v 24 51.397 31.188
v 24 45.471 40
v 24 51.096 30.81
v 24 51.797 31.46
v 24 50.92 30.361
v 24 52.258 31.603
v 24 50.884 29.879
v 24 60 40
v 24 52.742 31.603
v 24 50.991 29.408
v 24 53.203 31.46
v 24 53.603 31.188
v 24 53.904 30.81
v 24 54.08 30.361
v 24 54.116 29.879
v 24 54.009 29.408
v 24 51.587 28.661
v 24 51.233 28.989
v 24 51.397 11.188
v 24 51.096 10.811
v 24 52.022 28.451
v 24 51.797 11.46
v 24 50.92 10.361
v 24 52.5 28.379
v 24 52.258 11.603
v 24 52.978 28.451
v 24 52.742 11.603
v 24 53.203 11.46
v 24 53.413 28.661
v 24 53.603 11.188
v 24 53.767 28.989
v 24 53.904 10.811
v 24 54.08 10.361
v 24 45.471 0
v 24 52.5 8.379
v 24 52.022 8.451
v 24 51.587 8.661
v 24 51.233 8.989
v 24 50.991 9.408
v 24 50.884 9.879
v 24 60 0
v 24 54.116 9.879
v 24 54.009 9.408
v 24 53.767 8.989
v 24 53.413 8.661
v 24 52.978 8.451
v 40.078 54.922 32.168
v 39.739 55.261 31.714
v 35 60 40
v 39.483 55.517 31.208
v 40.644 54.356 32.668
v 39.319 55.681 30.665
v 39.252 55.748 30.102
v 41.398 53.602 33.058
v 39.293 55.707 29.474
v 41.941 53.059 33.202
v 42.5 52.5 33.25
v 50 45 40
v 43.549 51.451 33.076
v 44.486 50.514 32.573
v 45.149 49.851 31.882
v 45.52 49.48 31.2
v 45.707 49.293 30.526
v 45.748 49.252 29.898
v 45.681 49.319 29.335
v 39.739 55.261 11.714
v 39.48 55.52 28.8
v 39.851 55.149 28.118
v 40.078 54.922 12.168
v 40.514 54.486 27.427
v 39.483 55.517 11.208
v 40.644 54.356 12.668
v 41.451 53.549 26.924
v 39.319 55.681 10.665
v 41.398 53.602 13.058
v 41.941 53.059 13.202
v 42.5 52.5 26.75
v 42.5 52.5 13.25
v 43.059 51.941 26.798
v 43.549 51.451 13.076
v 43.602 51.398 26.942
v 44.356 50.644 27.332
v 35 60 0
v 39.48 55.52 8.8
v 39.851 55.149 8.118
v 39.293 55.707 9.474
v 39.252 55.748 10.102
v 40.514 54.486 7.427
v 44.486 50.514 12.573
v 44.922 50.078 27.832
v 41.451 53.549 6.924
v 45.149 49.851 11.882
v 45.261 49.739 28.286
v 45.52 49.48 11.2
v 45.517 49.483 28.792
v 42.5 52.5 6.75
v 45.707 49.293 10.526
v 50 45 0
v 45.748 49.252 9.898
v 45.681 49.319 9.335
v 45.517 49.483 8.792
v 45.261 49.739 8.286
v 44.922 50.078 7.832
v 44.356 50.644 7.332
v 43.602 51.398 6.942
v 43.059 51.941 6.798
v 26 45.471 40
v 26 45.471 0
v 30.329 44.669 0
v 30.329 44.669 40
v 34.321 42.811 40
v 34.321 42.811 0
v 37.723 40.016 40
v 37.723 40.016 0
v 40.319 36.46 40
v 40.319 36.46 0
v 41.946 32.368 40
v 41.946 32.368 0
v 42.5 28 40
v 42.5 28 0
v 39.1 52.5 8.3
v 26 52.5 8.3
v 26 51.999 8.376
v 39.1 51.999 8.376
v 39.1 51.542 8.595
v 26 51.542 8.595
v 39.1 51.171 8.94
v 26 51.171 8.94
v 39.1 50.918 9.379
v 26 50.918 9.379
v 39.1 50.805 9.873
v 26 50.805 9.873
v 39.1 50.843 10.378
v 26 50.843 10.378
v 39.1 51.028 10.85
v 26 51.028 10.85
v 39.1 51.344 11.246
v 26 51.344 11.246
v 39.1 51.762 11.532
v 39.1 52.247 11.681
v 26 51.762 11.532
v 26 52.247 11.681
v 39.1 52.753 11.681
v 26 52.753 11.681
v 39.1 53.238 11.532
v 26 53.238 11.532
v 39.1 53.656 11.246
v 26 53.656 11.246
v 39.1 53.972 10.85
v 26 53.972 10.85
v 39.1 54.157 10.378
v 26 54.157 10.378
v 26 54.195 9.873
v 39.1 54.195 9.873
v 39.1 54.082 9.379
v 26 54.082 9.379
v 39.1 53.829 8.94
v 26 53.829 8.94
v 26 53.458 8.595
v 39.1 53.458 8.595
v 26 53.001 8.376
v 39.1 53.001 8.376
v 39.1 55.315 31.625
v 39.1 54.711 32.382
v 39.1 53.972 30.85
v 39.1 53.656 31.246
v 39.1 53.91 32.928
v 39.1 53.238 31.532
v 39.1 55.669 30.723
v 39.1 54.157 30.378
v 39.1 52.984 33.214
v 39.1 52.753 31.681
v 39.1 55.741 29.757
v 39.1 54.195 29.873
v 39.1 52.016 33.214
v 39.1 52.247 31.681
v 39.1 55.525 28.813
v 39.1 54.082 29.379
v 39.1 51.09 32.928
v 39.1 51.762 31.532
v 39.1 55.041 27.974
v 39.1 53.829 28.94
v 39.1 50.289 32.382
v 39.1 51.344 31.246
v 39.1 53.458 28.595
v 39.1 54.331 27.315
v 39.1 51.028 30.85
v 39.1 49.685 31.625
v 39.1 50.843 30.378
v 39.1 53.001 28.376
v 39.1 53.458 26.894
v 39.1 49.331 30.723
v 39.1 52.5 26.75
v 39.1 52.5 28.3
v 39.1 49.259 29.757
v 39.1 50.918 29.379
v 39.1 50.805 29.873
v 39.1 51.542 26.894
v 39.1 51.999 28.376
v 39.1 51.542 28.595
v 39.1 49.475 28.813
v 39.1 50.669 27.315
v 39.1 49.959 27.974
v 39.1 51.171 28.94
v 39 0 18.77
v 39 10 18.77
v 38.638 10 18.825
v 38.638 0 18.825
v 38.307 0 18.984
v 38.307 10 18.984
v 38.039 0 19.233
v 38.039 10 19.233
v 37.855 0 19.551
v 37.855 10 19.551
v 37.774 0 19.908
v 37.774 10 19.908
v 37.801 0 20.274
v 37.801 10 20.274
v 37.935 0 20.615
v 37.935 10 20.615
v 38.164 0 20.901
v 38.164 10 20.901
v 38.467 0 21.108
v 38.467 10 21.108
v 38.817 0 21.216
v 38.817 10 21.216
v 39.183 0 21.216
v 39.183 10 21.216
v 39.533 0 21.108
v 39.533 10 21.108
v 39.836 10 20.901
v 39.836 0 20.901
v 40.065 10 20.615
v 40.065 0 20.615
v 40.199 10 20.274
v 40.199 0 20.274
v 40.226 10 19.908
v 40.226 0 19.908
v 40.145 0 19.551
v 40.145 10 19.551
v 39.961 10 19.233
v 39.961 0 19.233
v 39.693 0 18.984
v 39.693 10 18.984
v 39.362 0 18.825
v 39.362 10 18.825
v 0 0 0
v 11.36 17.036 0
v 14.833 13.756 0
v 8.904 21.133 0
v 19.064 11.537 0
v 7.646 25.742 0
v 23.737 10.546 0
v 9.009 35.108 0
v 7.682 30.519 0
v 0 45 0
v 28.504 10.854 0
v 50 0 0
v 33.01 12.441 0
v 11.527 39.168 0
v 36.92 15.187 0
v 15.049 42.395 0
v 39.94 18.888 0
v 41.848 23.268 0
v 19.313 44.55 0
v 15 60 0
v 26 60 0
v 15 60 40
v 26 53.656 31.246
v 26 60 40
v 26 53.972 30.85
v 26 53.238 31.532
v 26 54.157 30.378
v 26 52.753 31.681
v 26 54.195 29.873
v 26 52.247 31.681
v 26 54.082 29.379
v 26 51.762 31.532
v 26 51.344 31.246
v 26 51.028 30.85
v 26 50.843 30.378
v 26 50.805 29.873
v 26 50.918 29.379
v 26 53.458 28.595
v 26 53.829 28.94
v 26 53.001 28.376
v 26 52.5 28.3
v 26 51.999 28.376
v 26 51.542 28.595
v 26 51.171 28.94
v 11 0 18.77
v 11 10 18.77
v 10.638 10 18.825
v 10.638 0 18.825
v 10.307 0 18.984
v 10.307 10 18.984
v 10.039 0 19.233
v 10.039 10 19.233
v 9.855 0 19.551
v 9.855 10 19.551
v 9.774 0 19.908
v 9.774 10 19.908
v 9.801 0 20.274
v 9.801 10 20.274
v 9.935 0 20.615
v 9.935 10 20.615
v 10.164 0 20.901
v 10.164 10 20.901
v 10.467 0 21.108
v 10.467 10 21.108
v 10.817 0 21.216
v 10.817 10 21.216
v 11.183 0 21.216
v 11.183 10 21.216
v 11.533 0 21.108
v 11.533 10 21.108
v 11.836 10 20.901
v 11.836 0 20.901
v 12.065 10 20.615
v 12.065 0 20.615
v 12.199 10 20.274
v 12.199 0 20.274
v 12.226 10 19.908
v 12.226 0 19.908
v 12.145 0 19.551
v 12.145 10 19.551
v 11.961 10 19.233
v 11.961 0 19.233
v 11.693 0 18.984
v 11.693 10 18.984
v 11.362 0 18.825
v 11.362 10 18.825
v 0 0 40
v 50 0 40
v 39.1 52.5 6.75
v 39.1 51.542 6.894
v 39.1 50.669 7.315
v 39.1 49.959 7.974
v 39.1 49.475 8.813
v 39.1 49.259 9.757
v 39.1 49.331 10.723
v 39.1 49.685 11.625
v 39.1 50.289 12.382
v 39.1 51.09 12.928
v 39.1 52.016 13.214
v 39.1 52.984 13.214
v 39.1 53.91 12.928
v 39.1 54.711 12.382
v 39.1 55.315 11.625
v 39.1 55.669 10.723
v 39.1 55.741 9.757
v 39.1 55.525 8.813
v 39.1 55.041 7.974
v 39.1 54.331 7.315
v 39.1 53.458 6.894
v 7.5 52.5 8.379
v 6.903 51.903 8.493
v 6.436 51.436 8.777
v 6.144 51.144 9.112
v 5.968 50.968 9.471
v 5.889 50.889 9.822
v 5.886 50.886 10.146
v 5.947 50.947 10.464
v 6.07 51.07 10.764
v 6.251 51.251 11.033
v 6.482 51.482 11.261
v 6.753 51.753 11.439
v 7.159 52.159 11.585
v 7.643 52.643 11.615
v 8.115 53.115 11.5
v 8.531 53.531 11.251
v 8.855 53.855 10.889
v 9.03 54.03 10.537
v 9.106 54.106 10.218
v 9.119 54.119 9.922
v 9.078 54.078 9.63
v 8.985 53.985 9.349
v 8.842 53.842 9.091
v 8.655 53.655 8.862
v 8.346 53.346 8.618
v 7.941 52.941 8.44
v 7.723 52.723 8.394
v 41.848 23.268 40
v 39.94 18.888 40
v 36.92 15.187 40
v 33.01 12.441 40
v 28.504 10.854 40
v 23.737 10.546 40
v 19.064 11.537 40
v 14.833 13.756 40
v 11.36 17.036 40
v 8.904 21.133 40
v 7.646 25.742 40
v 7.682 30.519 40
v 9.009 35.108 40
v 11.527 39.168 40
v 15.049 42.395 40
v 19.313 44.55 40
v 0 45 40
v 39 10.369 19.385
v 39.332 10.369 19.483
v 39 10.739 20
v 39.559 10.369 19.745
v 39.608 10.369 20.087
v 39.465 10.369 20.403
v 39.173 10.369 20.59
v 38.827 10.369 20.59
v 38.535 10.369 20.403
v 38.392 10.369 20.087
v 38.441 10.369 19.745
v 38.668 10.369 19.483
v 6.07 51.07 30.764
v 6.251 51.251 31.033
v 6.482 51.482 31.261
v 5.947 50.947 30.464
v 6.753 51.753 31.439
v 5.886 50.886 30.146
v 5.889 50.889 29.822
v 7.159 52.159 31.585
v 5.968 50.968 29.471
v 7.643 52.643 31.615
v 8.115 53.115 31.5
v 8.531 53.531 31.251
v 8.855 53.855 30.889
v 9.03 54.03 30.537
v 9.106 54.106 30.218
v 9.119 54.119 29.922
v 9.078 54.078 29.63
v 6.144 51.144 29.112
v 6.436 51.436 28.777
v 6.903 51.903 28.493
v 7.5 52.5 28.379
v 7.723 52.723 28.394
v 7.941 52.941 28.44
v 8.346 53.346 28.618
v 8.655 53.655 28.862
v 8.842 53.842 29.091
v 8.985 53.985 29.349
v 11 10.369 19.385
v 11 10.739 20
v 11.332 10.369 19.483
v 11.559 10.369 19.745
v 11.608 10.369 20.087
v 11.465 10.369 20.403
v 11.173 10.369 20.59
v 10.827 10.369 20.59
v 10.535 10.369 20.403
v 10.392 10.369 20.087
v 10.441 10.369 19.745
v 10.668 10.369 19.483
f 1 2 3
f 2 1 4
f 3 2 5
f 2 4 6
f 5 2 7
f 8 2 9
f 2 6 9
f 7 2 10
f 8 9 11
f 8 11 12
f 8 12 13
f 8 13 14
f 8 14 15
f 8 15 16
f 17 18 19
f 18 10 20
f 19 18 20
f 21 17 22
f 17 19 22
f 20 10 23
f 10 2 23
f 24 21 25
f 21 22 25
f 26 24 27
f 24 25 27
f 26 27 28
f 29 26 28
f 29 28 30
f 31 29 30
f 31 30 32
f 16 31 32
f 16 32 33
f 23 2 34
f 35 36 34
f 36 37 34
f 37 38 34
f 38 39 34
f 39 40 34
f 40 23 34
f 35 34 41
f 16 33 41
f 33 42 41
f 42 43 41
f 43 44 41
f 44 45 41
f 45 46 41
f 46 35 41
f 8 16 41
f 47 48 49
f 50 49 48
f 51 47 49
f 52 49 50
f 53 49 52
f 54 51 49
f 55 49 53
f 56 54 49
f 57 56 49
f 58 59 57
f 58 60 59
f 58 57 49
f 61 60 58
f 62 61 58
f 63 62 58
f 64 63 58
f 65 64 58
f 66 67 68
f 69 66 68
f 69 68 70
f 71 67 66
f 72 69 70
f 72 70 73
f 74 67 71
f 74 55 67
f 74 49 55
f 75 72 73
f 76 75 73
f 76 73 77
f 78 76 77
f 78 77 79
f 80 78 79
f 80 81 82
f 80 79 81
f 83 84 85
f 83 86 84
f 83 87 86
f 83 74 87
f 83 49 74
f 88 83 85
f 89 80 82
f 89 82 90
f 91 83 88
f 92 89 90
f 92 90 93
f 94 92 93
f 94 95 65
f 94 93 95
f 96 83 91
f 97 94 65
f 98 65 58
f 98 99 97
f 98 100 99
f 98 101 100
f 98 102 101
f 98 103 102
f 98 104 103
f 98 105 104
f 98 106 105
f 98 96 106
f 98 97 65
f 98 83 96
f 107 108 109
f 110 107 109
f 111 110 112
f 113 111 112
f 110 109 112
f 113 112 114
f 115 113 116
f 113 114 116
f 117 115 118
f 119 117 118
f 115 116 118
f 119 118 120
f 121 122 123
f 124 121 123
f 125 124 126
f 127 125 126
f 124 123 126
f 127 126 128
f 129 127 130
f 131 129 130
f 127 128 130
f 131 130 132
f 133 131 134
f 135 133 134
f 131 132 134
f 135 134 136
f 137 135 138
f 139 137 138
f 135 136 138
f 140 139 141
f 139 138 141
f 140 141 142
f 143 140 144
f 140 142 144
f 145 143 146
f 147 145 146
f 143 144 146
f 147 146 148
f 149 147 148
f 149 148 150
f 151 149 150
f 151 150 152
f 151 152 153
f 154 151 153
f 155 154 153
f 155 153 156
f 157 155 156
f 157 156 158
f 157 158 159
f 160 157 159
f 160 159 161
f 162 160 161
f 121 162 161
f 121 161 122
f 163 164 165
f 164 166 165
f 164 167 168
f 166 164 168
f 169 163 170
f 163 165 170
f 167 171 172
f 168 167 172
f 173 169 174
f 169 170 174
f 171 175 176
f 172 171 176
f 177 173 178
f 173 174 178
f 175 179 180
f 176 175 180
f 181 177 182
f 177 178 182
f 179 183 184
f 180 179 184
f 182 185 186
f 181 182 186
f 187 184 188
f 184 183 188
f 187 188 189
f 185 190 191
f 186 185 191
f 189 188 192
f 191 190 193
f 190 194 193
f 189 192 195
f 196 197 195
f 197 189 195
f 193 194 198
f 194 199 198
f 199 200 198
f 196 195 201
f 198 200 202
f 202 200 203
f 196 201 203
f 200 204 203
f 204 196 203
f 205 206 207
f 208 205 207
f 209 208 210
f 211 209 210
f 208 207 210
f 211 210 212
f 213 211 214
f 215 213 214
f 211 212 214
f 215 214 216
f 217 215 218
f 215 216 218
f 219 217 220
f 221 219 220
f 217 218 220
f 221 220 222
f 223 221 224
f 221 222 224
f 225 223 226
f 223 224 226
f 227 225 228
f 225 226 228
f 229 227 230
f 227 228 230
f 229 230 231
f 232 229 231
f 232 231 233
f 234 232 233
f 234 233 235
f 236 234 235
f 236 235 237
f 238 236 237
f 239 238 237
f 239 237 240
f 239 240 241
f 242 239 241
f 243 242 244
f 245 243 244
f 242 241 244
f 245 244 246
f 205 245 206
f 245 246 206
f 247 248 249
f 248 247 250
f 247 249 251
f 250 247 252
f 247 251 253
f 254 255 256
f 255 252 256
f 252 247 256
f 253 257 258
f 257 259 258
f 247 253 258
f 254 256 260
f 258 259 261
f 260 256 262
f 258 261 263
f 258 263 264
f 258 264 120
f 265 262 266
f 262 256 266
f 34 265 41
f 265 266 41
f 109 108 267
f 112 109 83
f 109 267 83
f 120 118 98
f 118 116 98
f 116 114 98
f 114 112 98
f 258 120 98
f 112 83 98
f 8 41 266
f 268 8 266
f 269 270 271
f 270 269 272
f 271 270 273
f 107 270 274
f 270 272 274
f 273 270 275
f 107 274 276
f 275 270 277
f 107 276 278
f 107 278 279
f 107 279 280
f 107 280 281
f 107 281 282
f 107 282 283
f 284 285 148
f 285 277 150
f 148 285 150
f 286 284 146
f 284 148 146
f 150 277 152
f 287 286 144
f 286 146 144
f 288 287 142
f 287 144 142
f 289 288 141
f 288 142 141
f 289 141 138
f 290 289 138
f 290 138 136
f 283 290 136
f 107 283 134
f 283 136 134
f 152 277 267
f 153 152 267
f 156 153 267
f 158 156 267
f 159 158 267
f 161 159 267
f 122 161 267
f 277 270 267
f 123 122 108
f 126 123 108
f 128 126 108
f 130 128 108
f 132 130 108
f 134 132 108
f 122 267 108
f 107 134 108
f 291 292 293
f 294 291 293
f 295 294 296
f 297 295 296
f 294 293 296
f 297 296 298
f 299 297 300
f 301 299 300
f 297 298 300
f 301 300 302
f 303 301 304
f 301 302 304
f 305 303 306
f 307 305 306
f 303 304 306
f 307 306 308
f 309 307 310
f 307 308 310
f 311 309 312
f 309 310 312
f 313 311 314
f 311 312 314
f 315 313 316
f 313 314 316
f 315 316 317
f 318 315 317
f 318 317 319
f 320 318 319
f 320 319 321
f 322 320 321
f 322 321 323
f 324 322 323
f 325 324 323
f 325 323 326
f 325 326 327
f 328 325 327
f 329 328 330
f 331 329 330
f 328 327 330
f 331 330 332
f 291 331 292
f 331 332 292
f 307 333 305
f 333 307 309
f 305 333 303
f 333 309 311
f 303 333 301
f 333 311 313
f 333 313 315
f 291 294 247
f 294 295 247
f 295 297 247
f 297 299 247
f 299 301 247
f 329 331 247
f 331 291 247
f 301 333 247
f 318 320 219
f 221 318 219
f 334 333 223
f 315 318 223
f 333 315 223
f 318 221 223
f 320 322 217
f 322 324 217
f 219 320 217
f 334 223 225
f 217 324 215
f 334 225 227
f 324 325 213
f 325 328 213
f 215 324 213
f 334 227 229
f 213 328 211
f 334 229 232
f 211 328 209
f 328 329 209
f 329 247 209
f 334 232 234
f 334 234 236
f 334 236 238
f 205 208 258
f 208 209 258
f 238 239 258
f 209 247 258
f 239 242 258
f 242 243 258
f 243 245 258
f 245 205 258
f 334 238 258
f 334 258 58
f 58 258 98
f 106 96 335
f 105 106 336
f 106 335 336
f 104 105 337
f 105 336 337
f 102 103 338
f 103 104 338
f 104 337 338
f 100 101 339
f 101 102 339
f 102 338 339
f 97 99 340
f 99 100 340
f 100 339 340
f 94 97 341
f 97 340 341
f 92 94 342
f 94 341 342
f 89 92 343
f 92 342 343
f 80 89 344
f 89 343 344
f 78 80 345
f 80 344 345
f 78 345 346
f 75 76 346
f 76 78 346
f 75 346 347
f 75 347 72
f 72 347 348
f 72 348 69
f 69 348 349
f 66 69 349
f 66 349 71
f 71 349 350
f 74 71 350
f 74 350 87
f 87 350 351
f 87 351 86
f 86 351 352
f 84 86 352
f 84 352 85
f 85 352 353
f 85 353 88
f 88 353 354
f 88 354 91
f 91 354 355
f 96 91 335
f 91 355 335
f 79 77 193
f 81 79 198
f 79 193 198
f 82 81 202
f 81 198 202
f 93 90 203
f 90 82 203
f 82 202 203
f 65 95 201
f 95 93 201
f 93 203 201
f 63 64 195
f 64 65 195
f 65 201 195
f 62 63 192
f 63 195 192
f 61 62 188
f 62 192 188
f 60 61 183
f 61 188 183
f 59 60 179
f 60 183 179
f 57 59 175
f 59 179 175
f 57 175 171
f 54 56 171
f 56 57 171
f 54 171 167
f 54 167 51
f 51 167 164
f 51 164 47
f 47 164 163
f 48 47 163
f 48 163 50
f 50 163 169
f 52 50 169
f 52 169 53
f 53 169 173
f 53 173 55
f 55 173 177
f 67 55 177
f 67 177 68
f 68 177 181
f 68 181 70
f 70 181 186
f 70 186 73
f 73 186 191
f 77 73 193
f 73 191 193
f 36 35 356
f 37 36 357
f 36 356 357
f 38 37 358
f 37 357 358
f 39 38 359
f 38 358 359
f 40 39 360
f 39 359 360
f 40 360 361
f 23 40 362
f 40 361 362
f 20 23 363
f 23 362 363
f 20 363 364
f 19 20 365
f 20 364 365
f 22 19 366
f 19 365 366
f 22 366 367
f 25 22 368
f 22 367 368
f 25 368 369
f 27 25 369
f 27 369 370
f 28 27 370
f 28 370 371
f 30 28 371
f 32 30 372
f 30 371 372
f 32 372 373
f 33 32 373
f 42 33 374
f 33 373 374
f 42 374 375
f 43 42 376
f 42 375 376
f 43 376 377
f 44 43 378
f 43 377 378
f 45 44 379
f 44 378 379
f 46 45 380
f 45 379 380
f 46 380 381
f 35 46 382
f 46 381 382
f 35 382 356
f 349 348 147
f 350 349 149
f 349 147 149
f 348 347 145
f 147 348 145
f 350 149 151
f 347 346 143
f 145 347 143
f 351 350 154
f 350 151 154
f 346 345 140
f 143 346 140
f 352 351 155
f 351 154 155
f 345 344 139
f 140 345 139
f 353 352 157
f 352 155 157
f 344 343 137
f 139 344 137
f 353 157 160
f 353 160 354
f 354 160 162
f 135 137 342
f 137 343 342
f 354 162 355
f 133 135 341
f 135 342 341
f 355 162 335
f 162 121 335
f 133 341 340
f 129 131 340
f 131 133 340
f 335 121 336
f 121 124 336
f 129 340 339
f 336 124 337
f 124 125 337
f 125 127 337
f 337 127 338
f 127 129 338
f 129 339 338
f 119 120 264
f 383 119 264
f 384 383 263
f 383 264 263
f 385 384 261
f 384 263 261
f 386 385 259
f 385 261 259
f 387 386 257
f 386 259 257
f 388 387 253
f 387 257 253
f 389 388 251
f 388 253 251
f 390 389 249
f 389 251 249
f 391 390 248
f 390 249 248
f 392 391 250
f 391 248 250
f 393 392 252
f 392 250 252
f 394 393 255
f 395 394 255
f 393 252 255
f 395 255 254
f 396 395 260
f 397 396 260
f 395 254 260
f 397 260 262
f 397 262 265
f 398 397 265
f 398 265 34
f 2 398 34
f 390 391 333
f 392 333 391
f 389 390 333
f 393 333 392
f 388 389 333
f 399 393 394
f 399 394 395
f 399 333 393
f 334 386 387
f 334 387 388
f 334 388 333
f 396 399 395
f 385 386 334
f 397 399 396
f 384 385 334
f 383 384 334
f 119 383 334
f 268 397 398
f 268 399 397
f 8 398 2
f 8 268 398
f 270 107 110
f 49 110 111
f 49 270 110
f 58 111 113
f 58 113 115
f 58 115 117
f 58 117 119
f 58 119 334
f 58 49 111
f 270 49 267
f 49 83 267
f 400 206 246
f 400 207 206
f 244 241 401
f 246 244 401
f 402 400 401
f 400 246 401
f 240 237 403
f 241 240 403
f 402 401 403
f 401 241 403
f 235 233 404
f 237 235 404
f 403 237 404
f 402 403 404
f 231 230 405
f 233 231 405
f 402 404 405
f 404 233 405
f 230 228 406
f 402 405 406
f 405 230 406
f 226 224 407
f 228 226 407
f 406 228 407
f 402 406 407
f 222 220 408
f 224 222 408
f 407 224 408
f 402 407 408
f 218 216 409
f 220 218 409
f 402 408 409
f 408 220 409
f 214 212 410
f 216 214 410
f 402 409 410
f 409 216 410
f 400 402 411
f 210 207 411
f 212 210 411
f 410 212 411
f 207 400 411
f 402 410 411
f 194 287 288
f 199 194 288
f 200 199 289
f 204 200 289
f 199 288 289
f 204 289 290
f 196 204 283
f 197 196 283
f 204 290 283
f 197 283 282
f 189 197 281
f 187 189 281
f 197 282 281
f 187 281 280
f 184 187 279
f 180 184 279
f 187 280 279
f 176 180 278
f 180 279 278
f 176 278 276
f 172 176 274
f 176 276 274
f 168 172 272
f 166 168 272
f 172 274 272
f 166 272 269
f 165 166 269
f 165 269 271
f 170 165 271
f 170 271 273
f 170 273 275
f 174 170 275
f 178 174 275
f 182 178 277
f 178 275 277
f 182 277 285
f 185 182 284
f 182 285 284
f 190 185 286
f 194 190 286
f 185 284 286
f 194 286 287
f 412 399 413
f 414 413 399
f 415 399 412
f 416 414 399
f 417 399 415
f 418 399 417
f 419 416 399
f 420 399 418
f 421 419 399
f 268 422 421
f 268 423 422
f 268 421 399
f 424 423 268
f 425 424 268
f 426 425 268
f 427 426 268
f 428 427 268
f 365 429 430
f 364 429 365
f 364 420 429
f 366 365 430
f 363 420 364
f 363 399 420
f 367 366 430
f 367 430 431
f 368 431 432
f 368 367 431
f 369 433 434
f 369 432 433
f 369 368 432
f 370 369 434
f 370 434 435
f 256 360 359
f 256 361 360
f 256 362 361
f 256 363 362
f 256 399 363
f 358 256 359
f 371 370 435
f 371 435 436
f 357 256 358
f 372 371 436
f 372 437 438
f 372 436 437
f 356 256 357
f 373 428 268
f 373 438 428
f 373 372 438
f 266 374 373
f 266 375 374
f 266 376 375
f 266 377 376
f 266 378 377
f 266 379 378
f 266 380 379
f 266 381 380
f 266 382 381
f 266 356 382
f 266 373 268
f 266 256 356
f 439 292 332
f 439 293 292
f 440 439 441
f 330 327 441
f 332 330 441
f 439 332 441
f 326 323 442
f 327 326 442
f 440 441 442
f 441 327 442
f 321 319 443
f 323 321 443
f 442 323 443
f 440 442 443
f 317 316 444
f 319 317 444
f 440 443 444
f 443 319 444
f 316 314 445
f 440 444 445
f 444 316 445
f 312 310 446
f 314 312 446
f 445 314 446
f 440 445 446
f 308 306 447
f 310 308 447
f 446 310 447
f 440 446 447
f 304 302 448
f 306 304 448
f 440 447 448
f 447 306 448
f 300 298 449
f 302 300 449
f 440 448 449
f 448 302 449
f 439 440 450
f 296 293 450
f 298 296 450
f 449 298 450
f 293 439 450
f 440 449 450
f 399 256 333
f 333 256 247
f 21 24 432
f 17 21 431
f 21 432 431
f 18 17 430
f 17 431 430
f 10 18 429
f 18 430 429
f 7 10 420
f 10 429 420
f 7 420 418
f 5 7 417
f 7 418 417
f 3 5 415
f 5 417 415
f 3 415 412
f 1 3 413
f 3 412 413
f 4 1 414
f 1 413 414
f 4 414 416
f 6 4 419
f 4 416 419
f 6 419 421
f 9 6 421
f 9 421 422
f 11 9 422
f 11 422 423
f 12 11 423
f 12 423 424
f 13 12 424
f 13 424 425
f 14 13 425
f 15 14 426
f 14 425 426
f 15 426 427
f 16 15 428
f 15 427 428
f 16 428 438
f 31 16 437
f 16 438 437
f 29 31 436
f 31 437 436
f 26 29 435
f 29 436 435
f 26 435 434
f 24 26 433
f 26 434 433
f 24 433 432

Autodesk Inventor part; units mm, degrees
sketch "Skizze1" plane through (0, 0, 0) normal (0, 0, 1) x (1, 0, 0)
  line L0 (0, 0) -> (50, 0)
  line L1 (50, 0) -> (50, 45)
  line L2 (35, 60) -> (15, 60)
  line L3 (0, 45) -> (0, 0)
  circle A0 centre (25, 28) radius 17.5
  line L4 (25, 28) -> (25, 0) construction
  line L5 (0, 45) -> (15, 60)
  line L6 (35, 60) -> (50, 45)
  line L7 (24, 60) -> (26, 60)
  line L8 (26, 60) -> (26, 28)
  line L9 (26, 28) -> (24, 28)
  line L10 (24, 28) -> (24, 60)
  point P0 (50, 60)
  point P1 (0, 60)
  point P2 (25, 60)
  dimension "d0" = 50
  dimension "d1" = 35
  dimension "d2" = 60
  dimension "d3" = 15
  dimension "d4" = 15
  dimension "d5" = 15
  dimension "d6" = 15
  dimension "d7" = 28
  dimension "d10" = 2
extrude "Extrusion1" add sketch "Skizze1" along normal blind 40 contours L3 L5 L2 L10 A0 L8 L6 L1 L0 | L2 L8 A0 L10
extrude "Extrusion2" cut sketch "Skizze1" along normal up to surface (40 mm away) contours L2 L8 A0 L10 | A0 L8 L9 L10 picked at (24.8888, 33.8323)
sketch "Skizze2" plane through (0, 0, 0) normal (0, -1, 0) x (1, 0, 0)
  line L0 (0, 0) -> (0, 40) construction
  line L1 (50, 0) -> (50, 40) construction
  line L2 (0, 40) -> (50, 40) construction
  line L3 (0, 0) -> (0, 40) construction
  line L4 (25, 20) -> (25, 40) construction
  line L5 (7.5, 40) -> (42.5, 40) construction
  line L6 (11, 20) -> (39, 20) construction
  point P0 (26, 40)
  point P1 (24, 40)
  point P2 (0, 20)
  dimension "d13" = 28
hole "Bohrung1" at (11, 0, 20) at (39, 0, 20) direction (0, 1, 0) diameter 2.459 depth 10 tip angle 118 thread size "M3x0.5" class "6H" standard "ISO Metric profile"
ref_plane "Arbeitsebene1" through (42.5, 0, 0) normal (1, 0, 0) x (0, 0, -1)
sketch "Skizze3" plane through (42.5, 0, 0) normal (1, 0, 0) x (0, 0, -1)
  line L0 (0, 60) -> (-40, 60) construction
  line L1 (0, 45) -> (-40, 45) construction
  line L2 (-40, 45) -> (-40, 60) construction
  line L3 (-40, 52.5) -> (0, 52.5) construction
  line L4 (0, 45) -> (0, 60) construction
  point P0 (0, 0)
  point P1 (-20, 52.5)
  point P2 (-30, 52.5)
  point P3 (-10, 52.5)
  dimension "d44" = 10
  dimension "d45" = 10
ref_plane "Arbeitsebene2" through (0, 0, 20) normal (0, 0, 1) x (1, 0, 0)
ref_plane "Arbeitsebene3" through (0, 0, 30) normal (0, 0, 1) x (1, 0, 0)
ref_plane "Arbeitsebene4" through (0, 0, 10) normal (0, 0, -1) x (-1, 0, 0)
sketch "Skizze5" plane through (50, 0, 40) normal (1, 0, 0) x (0, 0, -1)
  line L0 (20, -12) -> (20, 72) construction
  line L1 (10, -12) -> (10, 72) construction
  line L2 (30, 72) -> (30, -12) construction
  point P0 (40, 0)
  dimension "Hole_Dist2Center" = 10
  dimension "d37" = 10
hole "Bohrung2" at (42.5, 52.5, 30) at (42.5, 52.5, 10) direction (-1, 0, 0) diameter 3.4 depth 18.5 counterbore diameter 6.5 counterbore depth 3.4 clearance for "Inbusschraube DIN EN ISO 4762" size "M3" standard "DIN"
delete faces "Fläche löschen1" heal yes whole lump no faces at (42.5, 50.5955, 29.1479) (42.5, 51.6084, 10.6154)
sketch "Skizze4" plane through (24, 45.4714, 0) normal (1, 0, 0) x (0, 0, -1)
  line L0 (-20, 7.0286) -> (-30, 7.0286) construction
  line L1 (-30, -57.4714) -> (-30, 26.5286) construction
  line L2 (-10, 26.5286) -> (-10, -57.4714) construction
  point P0 (0, -45.4714)
  point P1 (-10, 7.0286)
hole "Bohrung3" at (24, 52.5, 30) at (24, 52.5, 10) direction (-1, 0, 0) diameter 3.242 end through all thread size "M4x0.7" class "6H" standard "ISO Metric profile"
equation "\"d0\" = Fixation_Width"
equation "\"d4\" = d3"
equation "\"d5\" = d3"
equation "\"d6\" = d5"
equation "\"d8\" = Fixation_Thickness"
equation "\"d11\" = Fixation_Thickness"
equation "\"d13\" = FixationHole_Dist"
equation "\"d44\" = Hole_Dist2Center"
equation "\"d45\" = d44"
equation "\"Fixation_Thickness\" = 40"
equation "\"Fixation_Width\" = 50"
equation "\"FixationHole_Dist\" = 28"
equation "\"d21\" = -0.5 * d5"
properties part number "Motor_ParallelMecha_Fixation_Holder"
